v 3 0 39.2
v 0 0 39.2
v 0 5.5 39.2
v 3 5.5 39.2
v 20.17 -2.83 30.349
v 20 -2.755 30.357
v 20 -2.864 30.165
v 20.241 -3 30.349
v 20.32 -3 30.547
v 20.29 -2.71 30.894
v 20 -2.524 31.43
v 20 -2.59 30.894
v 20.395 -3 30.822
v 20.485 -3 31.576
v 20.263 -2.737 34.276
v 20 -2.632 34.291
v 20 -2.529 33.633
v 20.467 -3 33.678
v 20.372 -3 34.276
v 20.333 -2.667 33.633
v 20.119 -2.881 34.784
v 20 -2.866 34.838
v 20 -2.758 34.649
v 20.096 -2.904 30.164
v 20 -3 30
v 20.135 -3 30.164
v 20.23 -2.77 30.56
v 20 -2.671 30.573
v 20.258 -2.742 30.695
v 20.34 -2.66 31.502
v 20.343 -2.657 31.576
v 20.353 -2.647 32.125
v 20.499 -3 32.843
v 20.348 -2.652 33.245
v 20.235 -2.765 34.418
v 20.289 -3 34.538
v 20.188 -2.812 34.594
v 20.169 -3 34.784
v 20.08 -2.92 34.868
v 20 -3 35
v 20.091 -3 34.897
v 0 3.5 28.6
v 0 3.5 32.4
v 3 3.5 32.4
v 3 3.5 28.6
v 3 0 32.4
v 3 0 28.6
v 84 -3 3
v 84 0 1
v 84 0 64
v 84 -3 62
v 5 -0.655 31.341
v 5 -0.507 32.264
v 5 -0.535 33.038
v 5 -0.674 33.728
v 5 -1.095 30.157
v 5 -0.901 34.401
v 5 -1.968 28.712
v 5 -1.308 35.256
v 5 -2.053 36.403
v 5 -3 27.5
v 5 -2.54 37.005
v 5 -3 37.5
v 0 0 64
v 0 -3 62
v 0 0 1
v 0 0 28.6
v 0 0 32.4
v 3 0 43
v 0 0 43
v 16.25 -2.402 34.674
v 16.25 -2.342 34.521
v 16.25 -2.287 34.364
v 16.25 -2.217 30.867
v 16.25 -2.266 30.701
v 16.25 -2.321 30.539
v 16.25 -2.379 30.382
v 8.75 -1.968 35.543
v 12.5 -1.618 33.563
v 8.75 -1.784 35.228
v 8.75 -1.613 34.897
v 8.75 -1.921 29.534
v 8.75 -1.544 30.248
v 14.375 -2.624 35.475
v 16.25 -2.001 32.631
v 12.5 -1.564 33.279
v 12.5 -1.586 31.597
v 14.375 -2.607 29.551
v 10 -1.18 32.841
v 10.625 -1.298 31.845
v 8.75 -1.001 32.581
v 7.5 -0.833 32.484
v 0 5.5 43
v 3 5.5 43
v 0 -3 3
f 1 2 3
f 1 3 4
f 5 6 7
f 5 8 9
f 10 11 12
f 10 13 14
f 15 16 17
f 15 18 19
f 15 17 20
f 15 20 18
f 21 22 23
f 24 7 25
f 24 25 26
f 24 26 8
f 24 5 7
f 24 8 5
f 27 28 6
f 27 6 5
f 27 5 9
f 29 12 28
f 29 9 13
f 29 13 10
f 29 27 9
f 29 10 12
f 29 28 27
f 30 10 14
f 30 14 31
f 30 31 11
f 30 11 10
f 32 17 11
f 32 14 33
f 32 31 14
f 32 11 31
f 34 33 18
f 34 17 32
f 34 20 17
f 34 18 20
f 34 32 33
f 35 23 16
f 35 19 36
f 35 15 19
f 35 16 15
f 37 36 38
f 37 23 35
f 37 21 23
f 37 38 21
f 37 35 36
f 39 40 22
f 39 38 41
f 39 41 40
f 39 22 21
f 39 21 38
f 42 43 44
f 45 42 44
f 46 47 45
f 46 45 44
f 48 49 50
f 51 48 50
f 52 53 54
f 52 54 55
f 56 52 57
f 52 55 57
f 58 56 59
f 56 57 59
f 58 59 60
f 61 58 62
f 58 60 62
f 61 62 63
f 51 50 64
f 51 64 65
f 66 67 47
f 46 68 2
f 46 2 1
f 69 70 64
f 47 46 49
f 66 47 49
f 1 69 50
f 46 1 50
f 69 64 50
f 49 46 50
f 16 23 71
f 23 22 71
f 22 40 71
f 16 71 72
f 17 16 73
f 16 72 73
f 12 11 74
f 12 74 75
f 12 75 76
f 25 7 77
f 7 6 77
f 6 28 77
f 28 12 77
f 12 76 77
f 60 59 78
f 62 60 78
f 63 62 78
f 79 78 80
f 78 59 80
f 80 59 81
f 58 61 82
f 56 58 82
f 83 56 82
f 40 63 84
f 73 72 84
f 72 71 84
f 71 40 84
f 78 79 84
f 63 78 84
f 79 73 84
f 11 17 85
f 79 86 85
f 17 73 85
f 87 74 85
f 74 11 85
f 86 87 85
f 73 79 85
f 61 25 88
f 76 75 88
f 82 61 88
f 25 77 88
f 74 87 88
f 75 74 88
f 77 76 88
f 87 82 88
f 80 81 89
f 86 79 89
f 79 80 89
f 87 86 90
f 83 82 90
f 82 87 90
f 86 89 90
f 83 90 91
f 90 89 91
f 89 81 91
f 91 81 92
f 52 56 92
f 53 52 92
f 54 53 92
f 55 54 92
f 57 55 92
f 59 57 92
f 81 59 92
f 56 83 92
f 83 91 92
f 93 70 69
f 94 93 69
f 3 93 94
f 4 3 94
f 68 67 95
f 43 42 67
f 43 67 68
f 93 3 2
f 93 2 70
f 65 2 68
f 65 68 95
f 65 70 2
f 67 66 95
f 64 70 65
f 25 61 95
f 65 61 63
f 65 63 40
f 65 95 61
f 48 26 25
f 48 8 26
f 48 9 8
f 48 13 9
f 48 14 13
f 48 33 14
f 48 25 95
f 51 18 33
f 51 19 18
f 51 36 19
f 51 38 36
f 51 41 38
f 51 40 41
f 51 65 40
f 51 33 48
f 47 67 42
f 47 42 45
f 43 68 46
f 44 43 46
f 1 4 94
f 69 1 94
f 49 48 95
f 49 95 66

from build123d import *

# Parameters (mm, degrees)
F1_W      = 84
F1_H      = 65
F2_DEPTH  = 3
F3_W      = 3
F3_H      = 3.8
F4_DEPTH  = 5.5
F0_W      = 3
F0_H      = 3.8
F14_DEPTH = 3.5


with BuildPart() as f2:
    # F1 (on Front) → F2 (new body)
    with BuildSketch(Plane.XZ):
        with Locations((42, 32.5)):
            Rectangle(F1_W, F1_H)
    extrude(amount=F2_DEPTH)

    # F3 (on face) → F4 (join)
    with BuildSketch(Plane.XZ):
        with Locations((1.5, 41.1)):
            Rectangle(F3_W, F3_H)
    extrude(amount=-F4_DEPTH)

    # F6: sweep along a path in F0
    with BuildLine(Plane.XZ) as f6_path:
        Line((0, 0), (87, 0))
    # F5 (on face) → F6 (sweep, cut)
    with BuildSketch(Plane(origin=(0, 0, 0), x_dir=(0, -1, 0), z_dir=(-1, 0, 0))):
        Polygon((3, 65), (0, 65), (0, 64), (3, 62), align=None)
        Polygon((0, 1), (0, 0), (3, 0), (3, 3), align=None)
    sweep(path=f6_path.line, mode=Mode.SUBTRACT)

    # F11 (on line) → F12 section 0
    with BuildSketch(Plane(origin=(20, 0, 0), x_dir=(0, -1, 0), z_dir=(-1, 0, 0))):
        with BuildLine():
            Line((3, 30), (3, 35))
            add(Edge.make_bspline(
                [(3, 30), (2.5, 30.5), (2.5, 32.5), (2.5, 34.5), (3, 35)],
                knots=[0, 0, 0, 0, 0.5, 1, 1, 1, 1], degree=3))
        make_face()
    # F9 (on line) → F12 section 1
    with BuildSketch(Plane(origin=(5, 0, 0), x_dir=(0, -1, 0), z_dir=(-1, 0, 0))):
        with BuildLine():
            Line((3, 27.5), (3, 37.5))
            add(Edge.make_bspline(
                [(3, 27.5), (2, 28.5), (-1, 32.5), (2, 36.5), (3, 37.5)],
                knots=[0, 0, 0, 0, 0.5, 1, 1, 1, 1], degree=3))
        make_face()
    loft(mode=Mode.SUBTRACT)

    # F11 (on line) → F13 (revolve, cut)
    with BuildSketch(Plane(origin=(20, 0, 0), x_dir=(0, -1, 0), z_dir=(-1, 0, 0))):
        with BuildLine():
            Line((3, 30), (3, 35))
            add(Edge.make_bspline(
                [(3, 30), (2.5, 30.5), (2.5, 32.5), (2.5, 34.5), (3, 35)],
                knots=[0, 0, 0, 0, 0.5, 1, 1, 1, 1], degree=3))
        make_face()
    revolve(axis=Axis((20, -3, 20), (0, 0, -1)), mode=Mode.SUBTRACT)

    # F0 (on Front) → F14 (join)
    with BuildSketch(Plane.XZ):
        with Locations((1.5, 30.5)):
            Rectangle(F0_W, F0_H)
    extrude(amount=-F14_DEPTH)


solid = f2.part
